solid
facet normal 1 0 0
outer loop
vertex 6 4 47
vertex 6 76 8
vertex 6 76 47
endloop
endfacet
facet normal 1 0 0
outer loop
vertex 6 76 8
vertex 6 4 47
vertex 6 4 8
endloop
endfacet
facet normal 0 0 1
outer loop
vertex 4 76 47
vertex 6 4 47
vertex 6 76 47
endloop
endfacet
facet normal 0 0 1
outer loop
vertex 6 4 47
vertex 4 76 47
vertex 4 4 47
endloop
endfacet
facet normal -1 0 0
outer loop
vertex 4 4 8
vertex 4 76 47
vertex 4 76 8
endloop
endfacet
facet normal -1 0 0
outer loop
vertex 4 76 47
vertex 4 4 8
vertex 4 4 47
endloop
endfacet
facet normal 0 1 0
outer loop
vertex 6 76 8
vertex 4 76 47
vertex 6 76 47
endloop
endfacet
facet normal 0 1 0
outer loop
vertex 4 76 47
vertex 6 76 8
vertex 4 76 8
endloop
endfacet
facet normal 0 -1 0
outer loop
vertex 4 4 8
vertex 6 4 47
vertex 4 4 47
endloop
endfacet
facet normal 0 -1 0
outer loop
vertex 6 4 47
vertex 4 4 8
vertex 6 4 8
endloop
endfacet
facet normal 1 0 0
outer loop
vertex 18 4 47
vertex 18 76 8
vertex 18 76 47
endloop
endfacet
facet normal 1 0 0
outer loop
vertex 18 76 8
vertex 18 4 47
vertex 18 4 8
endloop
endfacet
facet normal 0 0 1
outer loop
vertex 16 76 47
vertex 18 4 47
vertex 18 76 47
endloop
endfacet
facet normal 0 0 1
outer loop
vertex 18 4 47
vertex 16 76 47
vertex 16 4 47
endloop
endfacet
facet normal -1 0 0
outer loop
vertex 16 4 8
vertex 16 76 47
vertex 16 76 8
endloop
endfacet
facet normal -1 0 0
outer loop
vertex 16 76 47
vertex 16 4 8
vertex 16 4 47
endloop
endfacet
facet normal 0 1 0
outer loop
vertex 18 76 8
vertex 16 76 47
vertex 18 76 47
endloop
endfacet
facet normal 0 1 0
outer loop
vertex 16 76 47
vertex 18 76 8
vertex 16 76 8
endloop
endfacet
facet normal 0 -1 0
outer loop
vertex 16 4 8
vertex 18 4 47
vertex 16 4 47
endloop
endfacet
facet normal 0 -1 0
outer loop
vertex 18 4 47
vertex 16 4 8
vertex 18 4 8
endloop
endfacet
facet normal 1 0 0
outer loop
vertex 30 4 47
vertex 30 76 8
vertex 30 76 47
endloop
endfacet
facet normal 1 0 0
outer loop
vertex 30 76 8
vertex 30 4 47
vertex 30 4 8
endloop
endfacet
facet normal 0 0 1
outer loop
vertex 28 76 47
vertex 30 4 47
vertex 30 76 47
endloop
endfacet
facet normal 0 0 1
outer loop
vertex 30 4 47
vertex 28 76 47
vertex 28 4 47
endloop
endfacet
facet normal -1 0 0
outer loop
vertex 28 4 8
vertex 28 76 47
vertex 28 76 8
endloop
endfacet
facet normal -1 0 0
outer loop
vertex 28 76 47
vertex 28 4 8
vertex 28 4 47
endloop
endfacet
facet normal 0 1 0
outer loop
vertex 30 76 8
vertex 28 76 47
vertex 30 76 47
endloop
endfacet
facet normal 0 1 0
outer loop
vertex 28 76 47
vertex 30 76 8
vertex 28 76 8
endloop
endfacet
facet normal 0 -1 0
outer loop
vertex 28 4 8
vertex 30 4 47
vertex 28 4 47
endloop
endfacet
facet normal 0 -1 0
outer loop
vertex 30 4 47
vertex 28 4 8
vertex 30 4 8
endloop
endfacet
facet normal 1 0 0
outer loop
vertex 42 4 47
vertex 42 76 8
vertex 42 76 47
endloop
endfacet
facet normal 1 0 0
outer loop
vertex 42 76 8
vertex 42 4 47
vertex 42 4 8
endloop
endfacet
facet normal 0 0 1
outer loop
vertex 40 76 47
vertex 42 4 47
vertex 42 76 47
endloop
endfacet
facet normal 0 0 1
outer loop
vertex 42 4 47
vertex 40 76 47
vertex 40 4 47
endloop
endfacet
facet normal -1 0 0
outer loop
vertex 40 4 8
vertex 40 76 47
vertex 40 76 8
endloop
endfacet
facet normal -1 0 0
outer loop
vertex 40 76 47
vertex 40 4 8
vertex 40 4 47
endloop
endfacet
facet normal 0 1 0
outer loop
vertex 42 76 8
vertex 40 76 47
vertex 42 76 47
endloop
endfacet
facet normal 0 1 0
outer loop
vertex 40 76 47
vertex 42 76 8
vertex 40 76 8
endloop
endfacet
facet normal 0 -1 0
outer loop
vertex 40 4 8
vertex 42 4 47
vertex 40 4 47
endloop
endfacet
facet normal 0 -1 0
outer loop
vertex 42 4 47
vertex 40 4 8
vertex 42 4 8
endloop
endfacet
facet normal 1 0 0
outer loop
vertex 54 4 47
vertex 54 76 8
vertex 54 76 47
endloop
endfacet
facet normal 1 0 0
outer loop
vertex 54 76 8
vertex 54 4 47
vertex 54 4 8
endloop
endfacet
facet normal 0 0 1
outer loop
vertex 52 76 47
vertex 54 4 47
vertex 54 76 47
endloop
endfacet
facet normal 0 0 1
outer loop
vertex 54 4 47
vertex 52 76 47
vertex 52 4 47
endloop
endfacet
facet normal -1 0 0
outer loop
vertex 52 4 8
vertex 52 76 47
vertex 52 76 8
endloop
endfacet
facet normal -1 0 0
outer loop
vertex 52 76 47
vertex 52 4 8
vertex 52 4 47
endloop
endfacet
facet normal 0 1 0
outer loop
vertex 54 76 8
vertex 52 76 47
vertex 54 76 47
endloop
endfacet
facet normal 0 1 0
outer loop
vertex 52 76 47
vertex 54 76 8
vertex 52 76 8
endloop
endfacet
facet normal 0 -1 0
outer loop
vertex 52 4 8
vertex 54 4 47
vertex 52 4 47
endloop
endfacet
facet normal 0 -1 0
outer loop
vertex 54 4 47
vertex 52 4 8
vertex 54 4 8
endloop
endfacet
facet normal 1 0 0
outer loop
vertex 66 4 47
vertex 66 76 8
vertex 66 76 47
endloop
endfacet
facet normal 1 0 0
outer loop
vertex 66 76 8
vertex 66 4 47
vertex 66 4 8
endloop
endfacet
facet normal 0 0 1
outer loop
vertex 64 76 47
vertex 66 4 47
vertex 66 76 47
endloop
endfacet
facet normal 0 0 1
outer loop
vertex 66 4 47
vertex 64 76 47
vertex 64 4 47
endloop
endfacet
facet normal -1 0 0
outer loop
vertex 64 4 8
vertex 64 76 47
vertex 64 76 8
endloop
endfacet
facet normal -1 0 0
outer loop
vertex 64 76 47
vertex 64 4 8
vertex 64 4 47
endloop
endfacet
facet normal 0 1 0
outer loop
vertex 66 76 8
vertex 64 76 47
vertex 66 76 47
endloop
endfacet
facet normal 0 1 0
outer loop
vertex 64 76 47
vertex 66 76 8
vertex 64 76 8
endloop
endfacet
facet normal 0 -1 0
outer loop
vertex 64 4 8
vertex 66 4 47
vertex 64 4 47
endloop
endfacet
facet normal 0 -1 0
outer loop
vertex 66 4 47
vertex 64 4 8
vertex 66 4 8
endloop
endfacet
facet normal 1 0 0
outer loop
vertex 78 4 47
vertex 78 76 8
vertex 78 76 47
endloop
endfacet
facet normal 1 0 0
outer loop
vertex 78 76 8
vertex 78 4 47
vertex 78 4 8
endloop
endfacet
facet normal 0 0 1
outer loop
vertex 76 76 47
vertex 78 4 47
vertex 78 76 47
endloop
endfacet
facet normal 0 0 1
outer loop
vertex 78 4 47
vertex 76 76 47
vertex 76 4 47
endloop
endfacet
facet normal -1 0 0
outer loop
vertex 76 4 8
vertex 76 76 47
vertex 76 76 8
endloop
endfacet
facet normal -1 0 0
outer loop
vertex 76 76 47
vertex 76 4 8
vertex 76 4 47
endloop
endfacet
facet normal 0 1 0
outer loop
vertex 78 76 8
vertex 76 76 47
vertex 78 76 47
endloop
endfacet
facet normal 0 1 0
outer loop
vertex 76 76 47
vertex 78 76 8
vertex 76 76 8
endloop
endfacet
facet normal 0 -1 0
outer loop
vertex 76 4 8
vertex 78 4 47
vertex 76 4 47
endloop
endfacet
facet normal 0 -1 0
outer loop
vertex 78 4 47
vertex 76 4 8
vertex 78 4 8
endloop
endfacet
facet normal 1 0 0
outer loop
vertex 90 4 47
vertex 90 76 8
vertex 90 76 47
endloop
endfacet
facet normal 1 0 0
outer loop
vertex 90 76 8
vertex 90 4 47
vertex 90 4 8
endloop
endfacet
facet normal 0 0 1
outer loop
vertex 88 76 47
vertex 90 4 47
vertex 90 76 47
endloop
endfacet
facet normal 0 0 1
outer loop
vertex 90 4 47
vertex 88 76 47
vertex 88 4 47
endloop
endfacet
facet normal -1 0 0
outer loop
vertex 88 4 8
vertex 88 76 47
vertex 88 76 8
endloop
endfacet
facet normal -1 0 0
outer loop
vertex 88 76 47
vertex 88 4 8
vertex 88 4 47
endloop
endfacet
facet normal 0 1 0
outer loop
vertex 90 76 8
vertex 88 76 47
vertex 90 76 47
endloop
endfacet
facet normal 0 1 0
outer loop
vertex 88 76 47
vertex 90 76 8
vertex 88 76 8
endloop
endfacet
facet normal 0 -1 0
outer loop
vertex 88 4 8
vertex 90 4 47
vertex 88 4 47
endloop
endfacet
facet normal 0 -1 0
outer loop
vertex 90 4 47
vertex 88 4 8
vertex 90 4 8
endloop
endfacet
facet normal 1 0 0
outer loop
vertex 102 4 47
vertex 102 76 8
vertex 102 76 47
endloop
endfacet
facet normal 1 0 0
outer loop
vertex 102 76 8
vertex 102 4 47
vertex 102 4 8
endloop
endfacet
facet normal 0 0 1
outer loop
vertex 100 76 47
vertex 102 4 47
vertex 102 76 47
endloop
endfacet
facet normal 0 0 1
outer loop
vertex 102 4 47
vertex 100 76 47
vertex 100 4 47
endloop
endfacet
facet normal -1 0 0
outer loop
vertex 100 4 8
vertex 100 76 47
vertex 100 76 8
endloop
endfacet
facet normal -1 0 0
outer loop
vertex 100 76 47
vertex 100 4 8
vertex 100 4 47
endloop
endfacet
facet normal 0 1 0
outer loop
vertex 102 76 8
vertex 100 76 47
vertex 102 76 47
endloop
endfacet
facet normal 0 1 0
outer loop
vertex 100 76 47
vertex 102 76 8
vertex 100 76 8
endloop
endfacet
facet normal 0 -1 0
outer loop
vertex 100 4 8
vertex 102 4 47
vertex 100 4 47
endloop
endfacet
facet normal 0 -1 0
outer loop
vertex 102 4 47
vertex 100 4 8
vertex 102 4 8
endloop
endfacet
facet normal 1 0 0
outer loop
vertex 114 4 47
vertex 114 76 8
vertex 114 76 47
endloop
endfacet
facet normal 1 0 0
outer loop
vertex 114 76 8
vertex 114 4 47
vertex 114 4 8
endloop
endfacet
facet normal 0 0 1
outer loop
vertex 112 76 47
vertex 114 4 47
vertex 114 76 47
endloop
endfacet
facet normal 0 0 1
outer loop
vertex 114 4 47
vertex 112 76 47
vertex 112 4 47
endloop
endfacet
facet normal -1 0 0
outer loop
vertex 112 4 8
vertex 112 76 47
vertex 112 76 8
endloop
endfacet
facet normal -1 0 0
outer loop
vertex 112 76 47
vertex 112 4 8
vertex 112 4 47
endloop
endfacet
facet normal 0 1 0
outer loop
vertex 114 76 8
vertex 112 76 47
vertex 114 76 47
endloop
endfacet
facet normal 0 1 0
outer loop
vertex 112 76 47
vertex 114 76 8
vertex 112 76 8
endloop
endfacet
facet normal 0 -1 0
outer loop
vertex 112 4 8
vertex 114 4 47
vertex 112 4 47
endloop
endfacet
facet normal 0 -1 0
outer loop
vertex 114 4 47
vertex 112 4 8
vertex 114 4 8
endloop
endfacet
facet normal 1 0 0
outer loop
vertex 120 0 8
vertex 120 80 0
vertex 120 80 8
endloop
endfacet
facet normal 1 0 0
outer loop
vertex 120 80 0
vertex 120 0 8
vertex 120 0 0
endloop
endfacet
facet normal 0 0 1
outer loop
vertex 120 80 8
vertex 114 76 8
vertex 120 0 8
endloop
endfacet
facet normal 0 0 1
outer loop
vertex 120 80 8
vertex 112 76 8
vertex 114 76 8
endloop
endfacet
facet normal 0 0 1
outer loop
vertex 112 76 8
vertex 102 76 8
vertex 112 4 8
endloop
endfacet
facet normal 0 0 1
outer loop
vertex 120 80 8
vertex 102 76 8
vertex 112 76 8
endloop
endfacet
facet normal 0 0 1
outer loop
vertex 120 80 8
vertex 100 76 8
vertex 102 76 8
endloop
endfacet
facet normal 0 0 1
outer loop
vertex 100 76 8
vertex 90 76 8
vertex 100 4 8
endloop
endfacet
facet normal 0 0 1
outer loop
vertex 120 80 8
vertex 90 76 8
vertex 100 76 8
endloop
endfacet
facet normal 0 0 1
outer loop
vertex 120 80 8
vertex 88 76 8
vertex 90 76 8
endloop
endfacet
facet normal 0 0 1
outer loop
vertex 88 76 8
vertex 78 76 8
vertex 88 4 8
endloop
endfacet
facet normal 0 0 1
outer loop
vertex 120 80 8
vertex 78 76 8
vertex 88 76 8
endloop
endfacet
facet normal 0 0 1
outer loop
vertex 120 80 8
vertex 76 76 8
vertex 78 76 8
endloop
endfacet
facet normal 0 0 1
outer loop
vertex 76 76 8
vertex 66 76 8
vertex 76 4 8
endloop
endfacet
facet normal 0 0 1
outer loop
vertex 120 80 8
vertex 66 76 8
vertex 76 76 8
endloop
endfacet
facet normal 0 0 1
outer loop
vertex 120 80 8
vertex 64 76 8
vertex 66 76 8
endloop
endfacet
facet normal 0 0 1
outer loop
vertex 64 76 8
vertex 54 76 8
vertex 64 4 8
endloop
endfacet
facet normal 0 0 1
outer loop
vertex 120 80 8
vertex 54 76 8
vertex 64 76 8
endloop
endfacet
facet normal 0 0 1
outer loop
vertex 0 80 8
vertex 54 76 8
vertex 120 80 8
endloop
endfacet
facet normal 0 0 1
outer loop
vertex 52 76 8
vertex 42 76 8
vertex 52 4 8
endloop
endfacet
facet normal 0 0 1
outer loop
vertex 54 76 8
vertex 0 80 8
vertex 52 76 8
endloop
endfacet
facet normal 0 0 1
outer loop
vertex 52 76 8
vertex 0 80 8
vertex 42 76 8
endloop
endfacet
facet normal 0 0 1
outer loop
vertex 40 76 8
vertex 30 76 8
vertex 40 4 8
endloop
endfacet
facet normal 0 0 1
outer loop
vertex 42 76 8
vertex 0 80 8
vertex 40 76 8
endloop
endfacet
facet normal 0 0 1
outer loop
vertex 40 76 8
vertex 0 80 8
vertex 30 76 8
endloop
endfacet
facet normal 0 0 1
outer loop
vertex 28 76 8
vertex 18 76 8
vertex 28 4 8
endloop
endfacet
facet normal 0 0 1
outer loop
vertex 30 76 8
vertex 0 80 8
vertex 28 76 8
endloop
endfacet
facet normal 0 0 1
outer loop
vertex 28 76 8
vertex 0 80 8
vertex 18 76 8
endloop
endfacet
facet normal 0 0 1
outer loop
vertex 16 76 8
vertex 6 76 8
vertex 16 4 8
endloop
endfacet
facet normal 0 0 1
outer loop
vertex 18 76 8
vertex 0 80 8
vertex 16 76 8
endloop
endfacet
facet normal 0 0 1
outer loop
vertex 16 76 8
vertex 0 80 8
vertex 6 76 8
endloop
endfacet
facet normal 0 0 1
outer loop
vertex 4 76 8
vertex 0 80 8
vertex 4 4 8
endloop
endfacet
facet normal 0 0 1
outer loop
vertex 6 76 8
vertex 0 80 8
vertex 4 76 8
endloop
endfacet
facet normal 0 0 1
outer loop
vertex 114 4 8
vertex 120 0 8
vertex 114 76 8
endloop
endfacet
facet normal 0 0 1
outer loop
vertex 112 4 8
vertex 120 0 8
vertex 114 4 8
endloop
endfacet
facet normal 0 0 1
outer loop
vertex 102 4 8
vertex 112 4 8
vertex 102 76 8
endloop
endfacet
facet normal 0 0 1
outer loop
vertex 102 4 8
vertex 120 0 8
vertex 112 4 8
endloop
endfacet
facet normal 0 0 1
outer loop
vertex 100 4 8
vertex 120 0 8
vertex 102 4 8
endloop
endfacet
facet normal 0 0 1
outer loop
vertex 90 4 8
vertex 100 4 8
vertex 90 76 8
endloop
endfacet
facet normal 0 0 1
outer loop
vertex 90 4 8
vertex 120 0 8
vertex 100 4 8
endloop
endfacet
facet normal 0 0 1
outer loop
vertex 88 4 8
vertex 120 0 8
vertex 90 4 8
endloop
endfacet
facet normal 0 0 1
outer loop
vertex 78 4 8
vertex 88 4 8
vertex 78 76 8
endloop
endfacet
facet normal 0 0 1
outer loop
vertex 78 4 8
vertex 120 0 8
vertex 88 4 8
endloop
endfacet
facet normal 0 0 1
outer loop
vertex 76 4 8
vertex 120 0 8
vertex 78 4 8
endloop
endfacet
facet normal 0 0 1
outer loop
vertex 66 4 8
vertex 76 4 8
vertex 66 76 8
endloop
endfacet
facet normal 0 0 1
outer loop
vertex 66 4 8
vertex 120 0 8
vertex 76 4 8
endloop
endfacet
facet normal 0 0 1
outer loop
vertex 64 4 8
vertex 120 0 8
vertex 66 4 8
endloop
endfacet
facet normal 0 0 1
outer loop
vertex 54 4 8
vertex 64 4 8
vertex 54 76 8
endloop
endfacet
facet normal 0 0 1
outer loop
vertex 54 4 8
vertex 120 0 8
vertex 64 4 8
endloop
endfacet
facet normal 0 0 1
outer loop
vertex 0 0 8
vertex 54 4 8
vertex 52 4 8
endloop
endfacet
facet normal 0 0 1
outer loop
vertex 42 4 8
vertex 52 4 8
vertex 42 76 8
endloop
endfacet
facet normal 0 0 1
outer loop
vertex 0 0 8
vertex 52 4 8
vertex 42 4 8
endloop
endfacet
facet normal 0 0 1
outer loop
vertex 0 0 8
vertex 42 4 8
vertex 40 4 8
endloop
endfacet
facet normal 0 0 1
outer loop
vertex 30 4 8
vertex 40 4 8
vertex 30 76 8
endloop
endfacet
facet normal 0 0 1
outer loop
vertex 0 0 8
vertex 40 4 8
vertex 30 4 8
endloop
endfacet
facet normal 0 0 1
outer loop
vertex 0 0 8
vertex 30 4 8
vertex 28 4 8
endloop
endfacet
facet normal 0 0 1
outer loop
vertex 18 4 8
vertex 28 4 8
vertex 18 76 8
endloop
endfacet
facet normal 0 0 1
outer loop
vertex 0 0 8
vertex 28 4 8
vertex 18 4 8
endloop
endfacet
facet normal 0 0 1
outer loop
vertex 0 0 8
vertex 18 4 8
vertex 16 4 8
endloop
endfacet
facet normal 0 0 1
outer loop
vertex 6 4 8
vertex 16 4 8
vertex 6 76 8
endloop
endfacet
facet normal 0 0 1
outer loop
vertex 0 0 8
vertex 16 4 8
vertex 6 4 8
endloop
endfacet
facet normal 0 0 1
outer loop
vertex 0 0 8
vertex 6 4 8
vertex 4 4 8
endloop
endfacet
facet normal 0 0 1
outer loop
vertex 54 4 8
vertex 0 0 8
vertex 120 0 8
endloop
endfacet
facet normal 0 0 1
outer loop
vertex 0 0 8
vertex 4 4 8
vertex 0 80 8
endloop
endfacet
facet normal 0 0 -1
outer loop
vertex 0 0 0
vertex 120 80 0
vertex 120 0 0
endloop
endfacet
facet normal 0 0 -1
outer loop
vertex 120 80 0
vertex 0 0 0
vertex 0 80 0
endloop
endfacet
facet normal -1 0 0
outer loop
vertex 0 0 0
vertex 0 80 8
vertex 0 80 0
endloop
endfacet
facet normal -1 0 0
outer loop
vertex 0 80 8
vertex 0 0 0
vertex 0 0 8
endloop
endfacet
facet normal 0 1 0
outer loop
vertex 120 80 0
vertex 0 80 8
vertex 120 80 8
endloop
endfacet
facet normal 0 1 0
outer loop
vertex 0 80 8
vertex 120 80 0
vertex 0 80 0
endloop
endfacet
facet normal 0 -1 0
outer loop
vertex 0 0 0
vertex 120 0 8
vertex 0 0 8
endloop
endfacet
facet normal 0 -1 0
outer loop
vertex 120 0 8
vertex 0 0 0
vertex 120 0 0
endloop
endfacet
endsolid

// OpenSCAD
$fn = 32;

// ----------------------------------------------------------------------
// Heatsink: uniform fin block
// ----------------------------------------------------------------------

// --- parameters (mm) ---
base_l = 120;             // base length, X
base_w = 80;              // base width, Y
base_t = 8;               // base plate thickness
fin_h = 40;               // fin height above the base
fin_t = 2;                // fin thickness
edge = 4;                 // margin from the base ends
pitch = 12;               // fin pitch

n_fins = floor((base_l - 2 * edge - fin_t) / pitch) + 1;  // fin count
total_h = base_t + fin_h - 1;  // overall height

union() {
  cube([base_l, base_w, base_t]);
  for (i = [0 : n_fins - 1])
    translate([edge + i * pitch, edge, base_t - 1])
      cube([fin_t, base_w - 2 * edge, fin_h]);
}
